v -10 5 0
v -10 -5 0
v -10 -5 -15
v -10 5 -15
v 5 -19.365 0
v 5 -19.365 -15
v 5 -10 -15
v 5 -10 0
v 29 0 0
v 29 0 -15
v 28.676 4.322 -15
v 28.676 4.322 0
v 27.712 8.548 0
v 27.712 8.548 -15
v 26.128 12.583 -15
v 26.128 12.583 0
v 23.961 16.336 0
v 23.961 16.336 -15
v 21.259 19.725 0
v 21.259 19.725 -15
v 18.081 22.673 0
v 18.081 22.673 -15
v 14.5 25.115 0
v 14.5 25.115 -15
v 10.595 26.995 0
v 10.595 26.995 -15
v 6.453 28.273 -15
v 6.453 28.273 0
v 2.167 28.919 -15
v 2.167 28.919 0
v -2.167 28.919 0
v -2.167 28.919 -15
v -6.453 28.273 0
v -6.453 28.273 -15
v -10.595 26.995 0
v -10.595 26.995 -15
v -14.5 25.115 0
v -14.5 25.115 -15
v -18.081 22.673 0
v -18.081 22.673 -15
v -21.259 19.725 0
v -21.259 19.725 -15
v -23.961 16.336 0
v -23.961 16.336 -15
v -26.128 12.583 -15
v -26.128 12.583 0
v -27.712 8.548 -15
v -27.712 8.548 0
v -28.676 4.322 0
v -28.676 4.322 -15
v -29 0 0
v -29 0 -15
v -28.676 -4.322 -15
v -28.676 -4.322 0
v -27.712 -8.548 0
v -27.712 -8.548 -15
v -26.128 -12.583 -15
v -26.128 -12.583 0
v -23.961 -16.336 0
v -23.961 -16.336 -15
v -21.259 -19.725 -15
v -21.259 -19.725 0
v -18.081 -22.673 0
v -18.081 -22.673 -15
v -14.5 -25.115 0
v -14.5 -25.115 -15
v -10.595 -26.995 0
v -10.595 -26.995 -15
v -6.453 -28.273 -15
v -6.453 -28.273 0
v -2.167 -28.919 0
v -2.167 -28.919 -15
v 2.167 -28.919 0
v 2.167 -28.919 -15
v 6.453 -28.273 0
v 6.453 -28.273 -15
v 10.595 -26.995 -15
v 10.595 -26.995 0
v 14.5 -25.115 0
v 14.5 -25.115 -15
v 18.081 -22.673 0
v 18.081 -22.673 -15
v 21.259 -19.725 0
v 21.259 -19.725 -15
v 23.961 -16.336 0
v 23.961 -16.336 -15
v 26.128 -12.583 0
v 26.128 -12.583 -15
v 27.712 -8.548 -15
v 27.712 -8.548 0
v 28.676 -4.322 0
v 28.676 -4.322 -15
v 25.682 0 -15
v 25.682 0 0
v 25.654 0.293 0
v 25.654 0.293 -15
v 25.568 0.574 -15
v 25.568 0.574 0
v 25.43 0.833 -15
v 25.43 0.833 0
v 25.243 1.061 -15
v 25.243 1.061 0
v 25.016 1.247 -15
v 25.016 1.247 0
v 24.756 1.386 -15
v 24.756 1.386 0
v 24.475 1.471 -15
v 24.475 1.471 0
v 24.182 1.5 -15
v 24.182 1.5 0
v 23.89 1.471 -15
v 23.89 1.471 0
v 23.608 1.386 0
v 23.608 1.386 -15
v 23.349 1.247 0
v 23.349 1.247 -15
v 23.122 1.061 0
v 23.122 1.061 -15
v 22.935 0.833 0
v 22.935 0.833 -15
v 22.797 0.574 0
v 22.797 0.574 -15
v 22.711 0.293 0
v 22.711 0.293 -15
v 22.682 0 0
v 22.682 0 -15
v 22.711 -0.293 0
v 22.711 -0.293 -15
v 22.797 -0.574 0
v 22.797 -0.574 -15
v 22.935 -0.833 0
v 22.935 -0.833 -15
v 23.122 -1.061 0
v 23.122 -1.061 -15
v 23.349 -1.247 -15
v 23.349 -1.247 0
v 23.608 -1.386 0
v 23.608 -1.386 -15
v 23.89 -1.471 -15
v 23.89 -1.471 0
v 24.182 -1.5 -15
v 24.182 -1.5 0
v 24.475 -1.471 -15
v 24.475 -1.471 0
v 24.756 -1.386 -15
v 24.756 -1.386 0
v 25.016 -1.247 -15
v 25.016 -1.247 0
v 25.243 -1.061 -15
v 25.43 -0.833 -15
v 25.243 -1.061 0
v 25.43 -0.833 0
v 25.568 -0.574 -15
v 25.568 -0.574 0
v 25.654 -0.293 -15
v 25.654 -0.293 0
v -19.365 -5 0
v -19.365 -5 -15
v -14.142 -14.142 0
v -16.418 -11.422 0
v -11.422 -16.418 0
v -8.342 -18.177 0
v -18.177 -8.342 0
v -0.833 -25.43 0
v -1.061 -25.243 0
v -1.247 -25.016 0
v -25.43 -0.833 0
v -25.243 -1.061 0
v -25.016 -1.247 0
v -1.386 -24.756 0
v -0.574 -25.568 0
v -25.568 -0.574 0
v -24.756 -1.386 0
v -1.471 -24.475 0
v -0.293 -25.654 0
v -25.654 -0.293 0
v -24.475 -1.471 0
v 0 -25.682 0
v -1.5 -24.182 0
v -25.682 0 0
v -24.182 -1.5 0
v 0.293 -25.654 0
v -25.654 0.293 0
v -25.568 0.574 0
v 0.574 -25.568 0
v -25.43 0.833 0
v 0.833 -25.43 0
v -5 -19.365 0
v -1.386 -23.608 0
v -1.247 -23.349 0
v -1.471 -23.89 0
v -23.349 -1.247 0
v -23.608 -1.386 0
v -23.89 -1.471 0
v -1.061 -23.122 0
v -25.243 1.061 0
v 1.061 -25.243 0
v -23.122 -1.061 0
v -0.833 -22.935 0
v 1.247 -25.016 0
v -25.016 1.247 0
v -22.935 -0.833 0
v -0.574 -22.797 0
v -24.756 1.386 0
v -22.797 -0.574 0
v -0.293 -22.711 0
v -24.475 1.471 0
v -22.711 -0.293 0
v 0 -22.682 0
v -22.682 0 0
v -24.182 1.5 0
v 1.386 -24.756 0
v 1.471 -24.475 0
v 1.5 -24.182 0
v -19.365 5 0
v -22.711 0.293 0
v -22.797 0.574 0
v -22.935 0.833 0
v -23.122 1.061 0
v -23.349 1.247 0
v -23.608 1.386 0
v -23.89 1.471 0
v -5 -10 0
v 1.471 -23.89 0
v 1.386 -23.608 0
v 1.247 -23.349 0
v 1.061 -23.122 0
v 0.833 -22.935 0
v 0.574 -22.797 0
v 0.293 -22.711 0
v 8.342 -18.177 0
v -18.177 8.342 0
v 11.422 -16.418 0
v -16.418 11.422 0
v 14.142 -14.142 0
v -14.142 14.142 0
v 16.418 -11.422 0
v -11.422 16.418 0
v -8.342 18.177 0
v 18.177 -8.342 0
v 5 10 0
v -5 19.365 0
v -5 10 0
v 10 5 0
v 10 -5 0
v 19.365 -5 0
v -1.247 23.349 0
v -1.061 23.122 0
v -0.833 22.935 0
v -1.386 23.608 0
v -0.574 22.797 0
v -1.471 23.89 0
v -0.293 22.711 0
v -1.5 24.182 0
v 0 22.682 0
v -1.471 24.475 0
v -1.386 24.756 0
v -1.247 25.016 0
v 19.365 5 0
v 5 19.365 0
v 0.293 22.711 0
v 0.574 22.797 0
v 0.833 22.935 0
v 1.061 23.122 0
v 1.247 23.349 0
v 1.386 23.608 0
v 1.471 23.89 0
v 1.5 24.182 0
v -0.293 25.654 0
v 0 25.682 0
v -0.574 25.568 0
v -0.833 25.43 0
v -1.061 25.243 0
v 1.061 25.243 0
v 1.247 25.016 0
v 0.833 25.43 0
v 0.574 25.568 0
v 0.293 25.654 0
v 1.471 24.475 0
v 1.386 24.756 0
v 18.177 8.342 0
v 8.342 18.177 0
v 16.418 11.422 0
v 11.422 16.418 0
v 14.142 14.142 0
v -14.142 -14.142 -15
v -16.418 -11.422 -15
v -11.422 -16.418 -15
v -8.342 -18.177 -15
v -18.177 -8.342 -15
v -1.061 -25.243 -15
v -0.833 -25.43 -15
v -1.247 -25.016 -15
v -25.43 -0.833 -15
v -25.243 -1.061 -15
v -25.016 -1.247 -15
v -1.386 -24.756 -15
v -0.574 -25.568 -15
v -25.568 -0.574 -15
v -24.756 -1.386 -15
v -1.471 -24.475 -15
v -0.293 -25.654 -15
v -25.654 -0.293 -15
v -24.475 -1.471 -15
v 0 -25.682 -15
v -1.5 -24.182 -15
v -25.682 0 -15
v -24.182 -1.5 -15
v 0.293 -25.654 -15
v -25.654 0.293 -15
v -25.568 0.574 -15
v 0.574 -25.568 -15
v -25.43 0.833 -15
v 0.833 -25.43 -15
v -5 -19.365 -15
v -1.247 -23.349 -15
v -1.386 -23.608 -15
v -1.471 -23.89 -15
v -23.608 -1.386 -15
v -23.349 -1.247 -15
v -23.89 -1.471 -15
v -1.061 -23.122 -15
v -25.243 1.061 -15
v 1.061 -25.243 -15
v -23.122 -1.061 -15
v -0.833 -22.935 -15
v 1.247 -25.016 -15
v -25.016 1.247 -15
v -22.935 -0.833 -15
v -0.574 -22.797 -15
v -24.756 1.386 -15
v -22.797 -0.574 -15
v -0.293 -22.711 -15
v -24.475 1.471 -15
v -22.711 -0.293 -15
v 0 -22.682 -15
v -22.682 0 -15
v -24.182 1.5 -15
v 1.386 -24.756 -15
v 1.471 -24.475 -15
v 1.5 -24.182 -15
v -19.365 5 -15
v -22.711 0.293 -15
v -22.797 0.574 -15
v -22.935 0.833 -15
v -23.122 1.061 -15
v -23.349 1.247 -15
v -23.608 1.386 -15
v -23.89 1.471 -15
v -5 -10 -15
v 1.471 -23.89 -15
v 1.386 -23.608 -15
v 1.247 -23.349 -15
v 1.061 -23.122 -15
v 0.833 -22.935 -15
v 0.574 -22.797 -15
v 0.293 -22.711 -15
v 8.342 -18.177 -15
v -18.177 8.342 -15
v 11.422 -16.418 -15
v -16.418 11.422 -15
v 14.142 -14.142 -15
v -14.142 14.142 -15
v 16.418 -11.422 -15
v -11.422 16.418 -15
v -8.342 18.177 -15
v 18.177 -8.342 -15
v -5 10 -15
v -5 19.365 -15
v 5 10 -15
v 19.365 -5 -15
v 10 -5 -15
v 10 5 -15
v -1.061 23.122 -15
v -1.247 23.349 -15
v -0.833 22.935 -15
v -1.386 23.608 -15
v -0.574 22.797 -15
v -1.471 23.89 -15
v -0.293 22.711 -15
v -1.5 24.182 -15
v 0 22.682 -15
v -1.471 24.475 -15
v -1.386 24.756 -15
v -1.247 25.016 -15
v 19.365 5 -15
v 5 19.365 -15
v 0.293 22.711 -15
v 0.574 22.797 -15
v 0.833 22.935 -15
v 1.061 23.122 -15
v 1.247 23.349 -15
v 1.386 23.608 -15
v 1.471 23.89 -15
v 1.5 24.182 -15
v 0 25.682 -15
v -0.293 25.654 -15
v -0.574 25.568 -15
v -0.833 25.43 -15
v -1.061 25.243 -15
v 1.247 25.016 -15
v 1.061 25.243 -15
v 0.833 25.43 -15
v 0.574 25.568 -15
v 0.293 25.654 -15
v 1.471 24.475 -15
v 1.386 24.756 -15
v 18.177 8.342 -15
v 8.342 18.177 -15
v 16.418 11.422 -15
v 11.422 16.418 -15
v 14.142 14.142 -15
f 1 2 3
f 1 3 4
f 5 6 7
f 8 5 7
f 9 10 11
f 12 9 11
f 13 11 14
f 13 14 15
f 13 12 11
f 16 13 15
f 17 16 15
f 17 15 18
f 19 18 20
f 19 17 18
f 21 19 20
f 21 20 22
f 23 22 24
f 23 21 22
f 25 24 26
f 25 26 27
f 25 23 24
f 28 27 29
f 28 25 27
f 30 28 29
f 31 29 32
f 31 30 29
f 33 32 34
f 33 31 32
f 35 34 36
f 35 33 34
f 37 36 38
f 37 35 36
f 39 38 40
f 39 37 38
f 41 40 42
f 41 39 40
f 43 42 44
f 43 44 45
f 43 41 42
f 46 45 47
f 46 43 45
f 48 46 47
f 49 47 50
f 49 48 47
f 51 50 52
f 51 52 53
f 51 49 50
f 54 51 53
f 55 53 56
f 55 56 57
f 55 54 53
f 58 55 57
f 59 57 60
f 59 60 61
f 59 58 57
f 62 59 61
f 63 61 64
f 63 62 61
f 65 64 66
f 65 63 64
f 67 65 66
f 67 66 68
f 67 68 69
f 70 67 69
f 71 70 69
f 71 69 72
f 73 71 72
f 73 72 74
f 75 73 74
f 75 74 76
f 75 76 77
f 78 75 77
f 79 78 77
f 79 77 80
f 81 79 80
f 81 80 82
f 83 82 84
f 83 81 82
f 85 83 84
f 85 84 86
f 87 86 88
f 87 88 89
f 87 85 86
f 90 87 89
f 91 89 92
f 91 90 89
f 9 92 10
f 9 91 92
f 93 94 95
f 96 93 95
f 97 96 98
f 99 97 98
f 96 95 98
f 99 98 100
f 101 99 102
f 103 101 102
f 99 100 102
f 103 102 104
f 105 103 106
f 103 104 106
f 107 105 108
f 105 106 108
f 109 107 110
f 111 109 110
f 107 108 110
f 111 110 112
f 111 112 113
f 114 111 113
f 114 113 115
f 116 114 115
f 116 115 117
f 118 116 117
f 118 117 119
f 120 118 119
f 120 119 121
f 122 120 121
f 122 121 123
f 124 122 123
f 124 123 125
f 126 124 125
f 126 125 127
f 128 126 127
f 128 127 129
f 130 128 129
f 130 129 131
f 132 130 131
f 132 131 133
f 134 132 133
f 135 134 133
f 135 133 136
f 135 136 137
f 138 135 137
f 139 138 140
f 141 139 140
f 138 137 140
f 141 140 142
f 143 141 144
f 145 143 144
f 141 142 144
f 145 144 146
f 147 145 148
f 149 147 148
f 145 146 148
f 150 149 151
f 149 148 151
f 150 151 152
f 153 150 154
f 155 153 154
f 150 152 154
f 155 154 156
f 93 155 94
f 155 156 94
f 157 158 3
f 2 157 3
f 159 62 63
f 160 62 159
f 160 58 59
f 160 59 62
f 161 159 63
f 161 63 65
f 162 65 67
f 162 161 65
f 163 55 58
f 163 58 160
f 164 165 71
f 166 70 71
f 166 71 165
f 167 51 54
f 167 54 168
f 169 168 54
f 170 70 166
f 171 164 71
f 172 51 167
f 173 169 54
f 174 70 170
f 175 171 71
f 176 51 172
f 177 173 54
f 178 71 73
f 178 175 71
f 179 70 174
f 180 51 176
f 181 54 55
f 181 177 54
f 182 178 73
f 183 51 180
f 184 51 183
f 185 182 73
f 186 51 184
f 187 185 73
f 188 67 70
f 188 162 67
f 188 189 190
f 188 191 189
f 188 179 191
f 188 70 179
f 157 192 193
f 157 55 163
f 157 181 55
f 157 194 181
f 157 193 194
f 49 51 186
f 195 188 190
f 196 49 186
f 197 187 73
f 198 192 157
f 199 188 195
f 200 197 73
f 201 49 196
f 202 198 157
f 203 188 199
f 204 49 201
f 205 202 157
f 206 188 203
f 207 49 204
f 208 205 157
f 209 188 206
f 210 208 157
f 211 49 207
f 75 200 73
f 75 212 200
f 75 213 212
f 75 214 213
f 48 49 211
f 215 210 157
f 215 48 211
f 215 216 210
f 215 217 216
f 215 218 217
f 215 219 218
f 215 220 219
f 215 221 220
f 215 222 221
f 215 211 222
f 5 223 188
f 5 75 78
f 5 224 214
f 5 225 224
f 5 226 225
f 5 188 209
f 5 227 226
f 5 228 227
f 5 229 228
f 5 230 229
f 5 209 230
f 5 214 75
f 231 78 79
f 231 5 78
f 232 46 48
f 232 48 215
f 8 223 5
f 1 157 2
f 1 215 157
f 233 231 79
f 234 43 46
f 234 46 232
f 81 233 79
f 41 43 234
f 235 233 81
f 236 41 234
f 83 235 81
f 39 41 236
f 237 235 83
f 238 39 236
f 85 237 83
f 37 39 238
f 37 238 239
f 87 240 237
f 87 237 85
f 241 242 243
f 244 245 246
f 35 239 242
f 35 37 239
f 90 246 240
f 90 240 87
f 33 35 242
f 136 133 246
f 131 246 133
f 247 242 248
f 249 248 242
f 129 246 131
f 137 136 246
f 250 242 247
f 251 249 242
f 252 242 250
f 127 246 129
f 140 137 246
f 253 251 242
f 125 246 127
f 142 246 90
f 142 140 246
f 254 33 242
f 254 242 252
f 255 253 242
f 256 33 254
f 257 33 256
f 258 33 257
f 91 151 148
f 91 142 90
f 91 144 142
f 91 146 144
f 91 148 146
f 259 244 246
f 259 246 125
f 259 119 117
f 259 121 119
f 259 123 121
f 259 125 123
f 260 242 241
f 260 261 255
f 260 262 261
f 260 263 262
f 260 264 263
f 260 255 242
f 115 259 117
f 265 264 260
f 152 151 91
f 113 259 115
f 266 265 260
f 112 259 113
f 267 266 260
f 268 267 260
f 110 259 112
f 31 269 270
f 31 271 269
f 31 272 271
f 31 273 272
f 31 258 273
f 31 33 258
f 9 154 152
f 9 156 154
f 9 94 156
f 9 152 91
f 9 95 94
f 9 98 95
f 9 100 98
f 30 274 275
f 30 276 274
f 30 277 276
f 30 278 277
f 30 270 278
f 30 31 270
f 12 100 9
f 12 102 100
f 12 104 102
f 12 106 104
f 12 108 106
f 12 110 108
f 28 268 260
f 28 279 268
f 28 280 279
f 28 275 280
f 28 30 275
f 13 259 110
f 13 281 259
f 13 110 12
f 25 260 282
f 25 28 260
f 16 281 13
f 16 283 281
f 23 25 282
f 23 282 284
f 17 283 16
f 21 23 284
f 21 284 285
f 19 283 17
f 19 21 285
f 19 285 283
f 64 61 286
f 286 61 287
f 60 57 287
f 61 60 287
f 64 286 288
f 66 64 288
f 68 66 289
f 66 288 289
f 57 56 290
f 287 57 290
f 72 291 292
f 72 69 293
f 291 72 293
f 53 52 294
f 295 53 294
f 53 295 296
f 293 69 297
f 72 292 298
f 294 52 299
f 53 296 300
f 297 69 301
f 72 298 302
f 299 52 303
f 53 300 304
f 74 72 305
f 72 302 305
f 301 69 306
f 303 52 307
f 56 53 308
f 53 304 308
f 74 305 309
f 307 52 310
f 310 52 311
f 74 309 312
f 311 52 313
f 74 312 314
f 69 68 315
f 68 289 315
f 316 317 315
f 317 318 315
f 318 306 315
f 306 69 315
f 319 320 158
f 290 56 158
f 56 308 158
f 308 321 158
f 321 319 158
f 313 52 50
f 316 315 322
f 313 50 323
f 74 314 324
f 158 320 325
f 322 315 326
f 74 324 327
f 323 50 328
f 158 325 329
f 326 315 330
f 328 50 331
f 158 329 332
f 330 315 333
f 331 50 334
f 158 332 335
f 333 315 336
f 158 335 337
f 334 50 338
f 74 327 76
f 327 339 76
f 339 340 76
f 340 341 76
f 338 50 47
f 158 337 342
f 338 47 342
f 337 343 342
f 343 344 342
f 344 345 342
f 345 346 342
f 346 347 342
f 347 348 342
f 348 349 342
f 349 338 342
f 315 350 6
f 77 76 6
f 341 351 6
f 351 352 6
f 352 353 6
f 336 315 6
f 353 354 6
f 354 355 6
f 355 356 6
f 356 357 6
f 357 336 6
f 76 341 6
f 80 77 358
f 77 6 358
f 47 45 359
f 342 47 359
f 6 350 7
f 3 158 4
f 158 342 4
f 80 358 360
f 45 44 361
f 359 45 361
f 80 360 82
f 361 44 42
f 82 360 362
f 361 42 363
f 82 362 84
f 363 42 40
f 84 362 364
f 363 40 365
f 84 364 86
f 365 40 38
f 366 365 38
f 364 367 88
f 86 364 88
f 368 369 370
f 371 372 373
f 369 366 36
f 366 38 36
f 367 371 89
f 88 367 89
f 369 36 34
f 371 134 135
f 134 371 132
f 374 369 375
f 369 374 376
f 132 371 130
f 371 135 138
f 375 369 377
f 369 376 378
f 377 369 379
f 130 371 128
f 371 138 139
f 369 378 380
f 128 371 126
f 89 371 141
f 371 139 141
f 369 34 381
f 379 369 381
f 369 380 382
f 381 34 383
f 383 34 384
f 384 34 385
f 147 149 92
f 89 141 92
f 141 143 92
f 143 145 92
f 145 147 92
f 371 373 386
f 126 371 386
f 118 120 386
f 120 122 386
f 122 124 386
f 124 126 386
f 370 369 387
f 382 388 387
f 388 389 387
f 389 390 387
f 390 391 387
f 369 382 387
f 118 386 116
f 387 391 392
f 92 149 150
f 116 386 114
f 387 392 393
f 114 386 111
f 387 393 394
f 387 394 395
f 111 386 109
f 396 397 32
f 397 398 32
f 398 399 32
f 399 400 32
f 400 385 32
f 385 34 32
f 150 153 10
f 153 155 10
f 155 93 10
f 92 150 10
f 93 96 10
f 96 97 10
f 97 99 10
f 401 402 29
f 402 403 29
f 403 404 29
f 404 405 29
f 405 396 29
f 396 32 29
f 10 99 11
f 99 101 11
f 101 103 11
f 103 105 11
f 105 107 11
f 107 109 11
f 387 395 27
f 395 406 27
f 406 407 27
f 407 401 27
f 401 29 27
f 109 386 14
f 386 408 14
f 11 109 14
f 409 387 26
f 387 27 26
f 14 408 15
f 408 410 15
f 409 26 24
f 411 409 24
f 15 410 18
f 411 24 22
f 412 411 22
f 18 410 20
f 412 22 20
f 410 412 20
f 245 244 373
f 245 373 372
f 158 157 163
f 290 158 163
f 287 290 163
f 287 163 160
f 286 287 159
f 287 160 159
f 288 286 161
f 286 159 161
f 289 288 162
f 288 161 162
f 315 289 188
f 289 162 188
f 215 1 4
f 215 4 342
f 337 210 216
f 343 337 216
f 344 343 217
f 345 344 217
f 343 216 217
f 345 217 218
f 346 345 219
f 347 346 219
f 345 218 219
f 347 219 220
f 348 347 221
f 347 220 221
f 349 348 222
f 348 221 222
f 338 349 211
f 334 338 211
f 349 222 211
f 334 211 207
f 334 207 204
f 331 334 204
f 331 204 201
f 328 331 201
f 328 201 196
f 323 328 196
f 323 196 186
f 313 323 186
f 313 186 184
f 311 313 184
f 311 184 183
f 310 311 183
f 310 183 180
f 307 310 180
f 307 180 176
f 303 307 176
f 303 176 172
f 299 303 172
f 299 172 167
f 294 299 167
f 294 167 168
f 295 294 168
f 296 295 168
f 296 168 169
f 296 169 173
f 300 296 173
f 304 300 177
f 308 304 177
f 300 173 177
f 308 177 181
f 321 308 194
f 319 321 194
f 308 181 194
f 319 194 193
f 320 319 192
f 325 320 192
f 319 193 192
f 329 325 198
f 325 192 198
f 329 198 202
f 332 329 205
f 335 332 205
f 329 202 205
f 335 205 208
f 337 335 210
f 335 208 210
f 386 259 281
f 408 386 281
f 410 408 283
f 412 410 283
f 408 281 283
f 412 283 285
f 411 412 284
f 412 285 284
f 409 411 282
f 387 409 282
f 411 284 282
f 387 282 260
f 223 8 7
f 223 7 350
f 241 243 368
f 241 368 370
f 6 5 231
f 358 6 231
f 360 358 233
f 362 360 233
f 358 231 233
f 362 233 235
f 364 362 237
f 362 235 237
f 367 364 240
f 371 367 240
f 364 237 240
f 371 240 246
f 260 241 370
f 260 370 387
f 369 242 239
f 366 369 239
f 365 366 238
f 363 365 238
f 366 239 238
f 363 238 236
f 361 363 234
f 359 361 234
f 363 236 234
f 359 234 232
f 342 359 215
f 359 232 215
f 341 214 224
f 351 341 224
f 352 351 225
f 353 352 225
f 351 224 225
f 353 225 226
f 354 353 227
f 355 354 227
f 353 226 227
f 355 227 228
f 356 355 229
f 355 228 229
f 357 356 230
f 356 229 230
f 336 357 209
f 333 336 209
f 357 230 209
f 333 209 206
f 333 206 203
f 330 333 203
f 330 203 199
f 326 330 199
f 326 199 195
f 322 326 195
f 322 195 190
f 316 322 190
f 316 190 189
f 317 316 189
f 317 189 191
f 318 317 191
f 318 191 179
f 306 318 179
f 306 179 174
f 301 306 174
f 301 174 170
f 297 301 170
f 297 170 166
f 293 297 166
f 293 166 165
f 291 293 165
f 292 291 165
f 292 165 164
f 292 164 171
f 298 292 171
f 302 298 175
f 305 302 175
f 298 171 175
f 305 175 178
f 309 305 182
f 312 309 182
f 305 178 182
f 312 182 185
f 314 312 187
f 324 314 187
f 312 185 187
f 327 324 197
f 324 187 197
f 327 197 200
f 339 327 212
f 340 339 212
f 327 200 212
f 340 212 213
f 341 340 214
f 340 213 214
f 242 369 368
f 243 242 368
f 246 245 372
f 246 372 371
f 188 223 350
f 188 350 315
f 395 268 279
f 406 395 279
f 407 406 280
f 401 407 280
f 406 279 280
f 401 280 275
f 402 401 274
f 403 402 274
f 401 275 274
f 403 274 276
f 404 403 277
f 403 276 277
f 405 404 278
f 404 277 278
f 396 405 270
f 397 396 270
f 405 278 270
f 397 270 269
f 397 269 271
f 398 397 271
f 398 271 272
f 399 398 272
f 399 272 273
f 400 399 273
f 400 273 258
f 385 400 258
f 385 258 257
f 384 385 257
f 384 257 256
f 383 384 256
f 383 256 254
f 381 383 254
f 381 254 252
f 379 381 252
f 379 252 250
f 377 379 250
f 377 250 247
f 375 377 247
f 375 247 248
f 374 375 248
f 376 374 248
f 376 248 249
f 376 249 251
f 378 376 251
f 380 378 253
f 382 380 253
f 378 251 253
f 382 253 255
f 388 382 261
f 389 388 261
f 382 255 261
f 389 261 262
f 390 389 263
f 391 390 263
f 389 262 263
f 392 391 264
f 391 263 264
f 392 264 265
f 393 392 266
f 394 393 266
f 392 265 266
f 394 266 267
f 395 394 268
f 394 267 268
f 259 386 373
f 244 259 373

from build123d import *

# Parameters (mm, degrees)
SKETCH6_R                 = 29
SKETCH6_R_2               = 20
INNER_RING_DEPTH          = 15
MOTOR_CONNECTOR_CUT_DEPTH = 15
SKETCH8_R                 = 1.5
M3_HOLES_DEPTH            = 38
M3_HOLES_DEPTH_BACK       = 53


with BuildPart() as part:
    # Sketch6 → Inner Ring (new body)
    with BuildSketch(Plane.XY):
        Circle(SKETCH6_R)
        Circle(SKETCH6_R_2, mode=Mode.SUBTRACT)
    extrude(amount=-INNER_RING_DEPTH)

    # Sketch7 → Motor Connector Cut (add)
    with BuildSketch(Plane.XY):
        with BuildLine():
            ThreePointArc((20, 0), (19.840593925, 2.52008585), (19.364916731, 5))
            Line((19.364916731, 5), (9.999996731, 5))
            Line((9.999996731, 5), (9.999996731, -5))
            Line((9.999996731, -5), (19.364916731, -5))
            ThreePointArc((19.364916731, -5), (19.840593925, -2.52008585), (20, 0))
        make_face()
        with BuildLine():
            ThreePointArc((5, 19.364916731), (0, 20), (-5, 19.364916731))
            Line((-5, 19.364916731), (-5, 9.999996731))
            Line((-5, 9.999996731), (5, 9.999996731))
            Line((5, 9.999996731), (5, 19.364916731))
        make_face()
        with BuildLine():
            Line((-9.999996731, -5), (-9.999996731, 5))
            Line((-9.999996731, 5), (-19.364916731, 5))
            ThreePointArc((-19.364916731, 5), (-20, 0), (-19.364916731, -5))
            Line((-19.364916731, -5), (-9.999996731, -5))
        make_face()
        with BuildLine():
            Line((-5, -9.999996731), (-5, -19.364916731))
            ThreePointArc((-5, -19.364916731), (0, -20), (5, -19.364916731))
            Line((5, -19.364916731), (5, -9.999996731))
            Line((5, -9.999996731), (-5, -9.999996731))
        make_face()
    extrude(amount=-MOTOR_CONNECTOR_CUT_DEPTH)

    # Sketch8 → M3 Holes (cut, two sides)
    with BuildSketch(Plane.XY) as m3_holes_sk:
        with Locations((0, 24.182458366)):
            Circle(SKETCH8_R)
        with Locations((24.182458366, 0)):
            Circle(SKETCH8_R)
        with Locations((0, -24.182458366)):
            Circle(SKETCH8_R)
        with Locations((-24.182458366, 0)):
            Circle(SKETCH8_R)
    extrude(amount=M3_HOLES_DEPTH, mode=Mode.SUBTRACT)
    extrude(m3_holes_sk.sketch, amount=-M3_HOLES_DEPTH_BACK, mode=Mode.SUBTRACT)


solid = part.part
